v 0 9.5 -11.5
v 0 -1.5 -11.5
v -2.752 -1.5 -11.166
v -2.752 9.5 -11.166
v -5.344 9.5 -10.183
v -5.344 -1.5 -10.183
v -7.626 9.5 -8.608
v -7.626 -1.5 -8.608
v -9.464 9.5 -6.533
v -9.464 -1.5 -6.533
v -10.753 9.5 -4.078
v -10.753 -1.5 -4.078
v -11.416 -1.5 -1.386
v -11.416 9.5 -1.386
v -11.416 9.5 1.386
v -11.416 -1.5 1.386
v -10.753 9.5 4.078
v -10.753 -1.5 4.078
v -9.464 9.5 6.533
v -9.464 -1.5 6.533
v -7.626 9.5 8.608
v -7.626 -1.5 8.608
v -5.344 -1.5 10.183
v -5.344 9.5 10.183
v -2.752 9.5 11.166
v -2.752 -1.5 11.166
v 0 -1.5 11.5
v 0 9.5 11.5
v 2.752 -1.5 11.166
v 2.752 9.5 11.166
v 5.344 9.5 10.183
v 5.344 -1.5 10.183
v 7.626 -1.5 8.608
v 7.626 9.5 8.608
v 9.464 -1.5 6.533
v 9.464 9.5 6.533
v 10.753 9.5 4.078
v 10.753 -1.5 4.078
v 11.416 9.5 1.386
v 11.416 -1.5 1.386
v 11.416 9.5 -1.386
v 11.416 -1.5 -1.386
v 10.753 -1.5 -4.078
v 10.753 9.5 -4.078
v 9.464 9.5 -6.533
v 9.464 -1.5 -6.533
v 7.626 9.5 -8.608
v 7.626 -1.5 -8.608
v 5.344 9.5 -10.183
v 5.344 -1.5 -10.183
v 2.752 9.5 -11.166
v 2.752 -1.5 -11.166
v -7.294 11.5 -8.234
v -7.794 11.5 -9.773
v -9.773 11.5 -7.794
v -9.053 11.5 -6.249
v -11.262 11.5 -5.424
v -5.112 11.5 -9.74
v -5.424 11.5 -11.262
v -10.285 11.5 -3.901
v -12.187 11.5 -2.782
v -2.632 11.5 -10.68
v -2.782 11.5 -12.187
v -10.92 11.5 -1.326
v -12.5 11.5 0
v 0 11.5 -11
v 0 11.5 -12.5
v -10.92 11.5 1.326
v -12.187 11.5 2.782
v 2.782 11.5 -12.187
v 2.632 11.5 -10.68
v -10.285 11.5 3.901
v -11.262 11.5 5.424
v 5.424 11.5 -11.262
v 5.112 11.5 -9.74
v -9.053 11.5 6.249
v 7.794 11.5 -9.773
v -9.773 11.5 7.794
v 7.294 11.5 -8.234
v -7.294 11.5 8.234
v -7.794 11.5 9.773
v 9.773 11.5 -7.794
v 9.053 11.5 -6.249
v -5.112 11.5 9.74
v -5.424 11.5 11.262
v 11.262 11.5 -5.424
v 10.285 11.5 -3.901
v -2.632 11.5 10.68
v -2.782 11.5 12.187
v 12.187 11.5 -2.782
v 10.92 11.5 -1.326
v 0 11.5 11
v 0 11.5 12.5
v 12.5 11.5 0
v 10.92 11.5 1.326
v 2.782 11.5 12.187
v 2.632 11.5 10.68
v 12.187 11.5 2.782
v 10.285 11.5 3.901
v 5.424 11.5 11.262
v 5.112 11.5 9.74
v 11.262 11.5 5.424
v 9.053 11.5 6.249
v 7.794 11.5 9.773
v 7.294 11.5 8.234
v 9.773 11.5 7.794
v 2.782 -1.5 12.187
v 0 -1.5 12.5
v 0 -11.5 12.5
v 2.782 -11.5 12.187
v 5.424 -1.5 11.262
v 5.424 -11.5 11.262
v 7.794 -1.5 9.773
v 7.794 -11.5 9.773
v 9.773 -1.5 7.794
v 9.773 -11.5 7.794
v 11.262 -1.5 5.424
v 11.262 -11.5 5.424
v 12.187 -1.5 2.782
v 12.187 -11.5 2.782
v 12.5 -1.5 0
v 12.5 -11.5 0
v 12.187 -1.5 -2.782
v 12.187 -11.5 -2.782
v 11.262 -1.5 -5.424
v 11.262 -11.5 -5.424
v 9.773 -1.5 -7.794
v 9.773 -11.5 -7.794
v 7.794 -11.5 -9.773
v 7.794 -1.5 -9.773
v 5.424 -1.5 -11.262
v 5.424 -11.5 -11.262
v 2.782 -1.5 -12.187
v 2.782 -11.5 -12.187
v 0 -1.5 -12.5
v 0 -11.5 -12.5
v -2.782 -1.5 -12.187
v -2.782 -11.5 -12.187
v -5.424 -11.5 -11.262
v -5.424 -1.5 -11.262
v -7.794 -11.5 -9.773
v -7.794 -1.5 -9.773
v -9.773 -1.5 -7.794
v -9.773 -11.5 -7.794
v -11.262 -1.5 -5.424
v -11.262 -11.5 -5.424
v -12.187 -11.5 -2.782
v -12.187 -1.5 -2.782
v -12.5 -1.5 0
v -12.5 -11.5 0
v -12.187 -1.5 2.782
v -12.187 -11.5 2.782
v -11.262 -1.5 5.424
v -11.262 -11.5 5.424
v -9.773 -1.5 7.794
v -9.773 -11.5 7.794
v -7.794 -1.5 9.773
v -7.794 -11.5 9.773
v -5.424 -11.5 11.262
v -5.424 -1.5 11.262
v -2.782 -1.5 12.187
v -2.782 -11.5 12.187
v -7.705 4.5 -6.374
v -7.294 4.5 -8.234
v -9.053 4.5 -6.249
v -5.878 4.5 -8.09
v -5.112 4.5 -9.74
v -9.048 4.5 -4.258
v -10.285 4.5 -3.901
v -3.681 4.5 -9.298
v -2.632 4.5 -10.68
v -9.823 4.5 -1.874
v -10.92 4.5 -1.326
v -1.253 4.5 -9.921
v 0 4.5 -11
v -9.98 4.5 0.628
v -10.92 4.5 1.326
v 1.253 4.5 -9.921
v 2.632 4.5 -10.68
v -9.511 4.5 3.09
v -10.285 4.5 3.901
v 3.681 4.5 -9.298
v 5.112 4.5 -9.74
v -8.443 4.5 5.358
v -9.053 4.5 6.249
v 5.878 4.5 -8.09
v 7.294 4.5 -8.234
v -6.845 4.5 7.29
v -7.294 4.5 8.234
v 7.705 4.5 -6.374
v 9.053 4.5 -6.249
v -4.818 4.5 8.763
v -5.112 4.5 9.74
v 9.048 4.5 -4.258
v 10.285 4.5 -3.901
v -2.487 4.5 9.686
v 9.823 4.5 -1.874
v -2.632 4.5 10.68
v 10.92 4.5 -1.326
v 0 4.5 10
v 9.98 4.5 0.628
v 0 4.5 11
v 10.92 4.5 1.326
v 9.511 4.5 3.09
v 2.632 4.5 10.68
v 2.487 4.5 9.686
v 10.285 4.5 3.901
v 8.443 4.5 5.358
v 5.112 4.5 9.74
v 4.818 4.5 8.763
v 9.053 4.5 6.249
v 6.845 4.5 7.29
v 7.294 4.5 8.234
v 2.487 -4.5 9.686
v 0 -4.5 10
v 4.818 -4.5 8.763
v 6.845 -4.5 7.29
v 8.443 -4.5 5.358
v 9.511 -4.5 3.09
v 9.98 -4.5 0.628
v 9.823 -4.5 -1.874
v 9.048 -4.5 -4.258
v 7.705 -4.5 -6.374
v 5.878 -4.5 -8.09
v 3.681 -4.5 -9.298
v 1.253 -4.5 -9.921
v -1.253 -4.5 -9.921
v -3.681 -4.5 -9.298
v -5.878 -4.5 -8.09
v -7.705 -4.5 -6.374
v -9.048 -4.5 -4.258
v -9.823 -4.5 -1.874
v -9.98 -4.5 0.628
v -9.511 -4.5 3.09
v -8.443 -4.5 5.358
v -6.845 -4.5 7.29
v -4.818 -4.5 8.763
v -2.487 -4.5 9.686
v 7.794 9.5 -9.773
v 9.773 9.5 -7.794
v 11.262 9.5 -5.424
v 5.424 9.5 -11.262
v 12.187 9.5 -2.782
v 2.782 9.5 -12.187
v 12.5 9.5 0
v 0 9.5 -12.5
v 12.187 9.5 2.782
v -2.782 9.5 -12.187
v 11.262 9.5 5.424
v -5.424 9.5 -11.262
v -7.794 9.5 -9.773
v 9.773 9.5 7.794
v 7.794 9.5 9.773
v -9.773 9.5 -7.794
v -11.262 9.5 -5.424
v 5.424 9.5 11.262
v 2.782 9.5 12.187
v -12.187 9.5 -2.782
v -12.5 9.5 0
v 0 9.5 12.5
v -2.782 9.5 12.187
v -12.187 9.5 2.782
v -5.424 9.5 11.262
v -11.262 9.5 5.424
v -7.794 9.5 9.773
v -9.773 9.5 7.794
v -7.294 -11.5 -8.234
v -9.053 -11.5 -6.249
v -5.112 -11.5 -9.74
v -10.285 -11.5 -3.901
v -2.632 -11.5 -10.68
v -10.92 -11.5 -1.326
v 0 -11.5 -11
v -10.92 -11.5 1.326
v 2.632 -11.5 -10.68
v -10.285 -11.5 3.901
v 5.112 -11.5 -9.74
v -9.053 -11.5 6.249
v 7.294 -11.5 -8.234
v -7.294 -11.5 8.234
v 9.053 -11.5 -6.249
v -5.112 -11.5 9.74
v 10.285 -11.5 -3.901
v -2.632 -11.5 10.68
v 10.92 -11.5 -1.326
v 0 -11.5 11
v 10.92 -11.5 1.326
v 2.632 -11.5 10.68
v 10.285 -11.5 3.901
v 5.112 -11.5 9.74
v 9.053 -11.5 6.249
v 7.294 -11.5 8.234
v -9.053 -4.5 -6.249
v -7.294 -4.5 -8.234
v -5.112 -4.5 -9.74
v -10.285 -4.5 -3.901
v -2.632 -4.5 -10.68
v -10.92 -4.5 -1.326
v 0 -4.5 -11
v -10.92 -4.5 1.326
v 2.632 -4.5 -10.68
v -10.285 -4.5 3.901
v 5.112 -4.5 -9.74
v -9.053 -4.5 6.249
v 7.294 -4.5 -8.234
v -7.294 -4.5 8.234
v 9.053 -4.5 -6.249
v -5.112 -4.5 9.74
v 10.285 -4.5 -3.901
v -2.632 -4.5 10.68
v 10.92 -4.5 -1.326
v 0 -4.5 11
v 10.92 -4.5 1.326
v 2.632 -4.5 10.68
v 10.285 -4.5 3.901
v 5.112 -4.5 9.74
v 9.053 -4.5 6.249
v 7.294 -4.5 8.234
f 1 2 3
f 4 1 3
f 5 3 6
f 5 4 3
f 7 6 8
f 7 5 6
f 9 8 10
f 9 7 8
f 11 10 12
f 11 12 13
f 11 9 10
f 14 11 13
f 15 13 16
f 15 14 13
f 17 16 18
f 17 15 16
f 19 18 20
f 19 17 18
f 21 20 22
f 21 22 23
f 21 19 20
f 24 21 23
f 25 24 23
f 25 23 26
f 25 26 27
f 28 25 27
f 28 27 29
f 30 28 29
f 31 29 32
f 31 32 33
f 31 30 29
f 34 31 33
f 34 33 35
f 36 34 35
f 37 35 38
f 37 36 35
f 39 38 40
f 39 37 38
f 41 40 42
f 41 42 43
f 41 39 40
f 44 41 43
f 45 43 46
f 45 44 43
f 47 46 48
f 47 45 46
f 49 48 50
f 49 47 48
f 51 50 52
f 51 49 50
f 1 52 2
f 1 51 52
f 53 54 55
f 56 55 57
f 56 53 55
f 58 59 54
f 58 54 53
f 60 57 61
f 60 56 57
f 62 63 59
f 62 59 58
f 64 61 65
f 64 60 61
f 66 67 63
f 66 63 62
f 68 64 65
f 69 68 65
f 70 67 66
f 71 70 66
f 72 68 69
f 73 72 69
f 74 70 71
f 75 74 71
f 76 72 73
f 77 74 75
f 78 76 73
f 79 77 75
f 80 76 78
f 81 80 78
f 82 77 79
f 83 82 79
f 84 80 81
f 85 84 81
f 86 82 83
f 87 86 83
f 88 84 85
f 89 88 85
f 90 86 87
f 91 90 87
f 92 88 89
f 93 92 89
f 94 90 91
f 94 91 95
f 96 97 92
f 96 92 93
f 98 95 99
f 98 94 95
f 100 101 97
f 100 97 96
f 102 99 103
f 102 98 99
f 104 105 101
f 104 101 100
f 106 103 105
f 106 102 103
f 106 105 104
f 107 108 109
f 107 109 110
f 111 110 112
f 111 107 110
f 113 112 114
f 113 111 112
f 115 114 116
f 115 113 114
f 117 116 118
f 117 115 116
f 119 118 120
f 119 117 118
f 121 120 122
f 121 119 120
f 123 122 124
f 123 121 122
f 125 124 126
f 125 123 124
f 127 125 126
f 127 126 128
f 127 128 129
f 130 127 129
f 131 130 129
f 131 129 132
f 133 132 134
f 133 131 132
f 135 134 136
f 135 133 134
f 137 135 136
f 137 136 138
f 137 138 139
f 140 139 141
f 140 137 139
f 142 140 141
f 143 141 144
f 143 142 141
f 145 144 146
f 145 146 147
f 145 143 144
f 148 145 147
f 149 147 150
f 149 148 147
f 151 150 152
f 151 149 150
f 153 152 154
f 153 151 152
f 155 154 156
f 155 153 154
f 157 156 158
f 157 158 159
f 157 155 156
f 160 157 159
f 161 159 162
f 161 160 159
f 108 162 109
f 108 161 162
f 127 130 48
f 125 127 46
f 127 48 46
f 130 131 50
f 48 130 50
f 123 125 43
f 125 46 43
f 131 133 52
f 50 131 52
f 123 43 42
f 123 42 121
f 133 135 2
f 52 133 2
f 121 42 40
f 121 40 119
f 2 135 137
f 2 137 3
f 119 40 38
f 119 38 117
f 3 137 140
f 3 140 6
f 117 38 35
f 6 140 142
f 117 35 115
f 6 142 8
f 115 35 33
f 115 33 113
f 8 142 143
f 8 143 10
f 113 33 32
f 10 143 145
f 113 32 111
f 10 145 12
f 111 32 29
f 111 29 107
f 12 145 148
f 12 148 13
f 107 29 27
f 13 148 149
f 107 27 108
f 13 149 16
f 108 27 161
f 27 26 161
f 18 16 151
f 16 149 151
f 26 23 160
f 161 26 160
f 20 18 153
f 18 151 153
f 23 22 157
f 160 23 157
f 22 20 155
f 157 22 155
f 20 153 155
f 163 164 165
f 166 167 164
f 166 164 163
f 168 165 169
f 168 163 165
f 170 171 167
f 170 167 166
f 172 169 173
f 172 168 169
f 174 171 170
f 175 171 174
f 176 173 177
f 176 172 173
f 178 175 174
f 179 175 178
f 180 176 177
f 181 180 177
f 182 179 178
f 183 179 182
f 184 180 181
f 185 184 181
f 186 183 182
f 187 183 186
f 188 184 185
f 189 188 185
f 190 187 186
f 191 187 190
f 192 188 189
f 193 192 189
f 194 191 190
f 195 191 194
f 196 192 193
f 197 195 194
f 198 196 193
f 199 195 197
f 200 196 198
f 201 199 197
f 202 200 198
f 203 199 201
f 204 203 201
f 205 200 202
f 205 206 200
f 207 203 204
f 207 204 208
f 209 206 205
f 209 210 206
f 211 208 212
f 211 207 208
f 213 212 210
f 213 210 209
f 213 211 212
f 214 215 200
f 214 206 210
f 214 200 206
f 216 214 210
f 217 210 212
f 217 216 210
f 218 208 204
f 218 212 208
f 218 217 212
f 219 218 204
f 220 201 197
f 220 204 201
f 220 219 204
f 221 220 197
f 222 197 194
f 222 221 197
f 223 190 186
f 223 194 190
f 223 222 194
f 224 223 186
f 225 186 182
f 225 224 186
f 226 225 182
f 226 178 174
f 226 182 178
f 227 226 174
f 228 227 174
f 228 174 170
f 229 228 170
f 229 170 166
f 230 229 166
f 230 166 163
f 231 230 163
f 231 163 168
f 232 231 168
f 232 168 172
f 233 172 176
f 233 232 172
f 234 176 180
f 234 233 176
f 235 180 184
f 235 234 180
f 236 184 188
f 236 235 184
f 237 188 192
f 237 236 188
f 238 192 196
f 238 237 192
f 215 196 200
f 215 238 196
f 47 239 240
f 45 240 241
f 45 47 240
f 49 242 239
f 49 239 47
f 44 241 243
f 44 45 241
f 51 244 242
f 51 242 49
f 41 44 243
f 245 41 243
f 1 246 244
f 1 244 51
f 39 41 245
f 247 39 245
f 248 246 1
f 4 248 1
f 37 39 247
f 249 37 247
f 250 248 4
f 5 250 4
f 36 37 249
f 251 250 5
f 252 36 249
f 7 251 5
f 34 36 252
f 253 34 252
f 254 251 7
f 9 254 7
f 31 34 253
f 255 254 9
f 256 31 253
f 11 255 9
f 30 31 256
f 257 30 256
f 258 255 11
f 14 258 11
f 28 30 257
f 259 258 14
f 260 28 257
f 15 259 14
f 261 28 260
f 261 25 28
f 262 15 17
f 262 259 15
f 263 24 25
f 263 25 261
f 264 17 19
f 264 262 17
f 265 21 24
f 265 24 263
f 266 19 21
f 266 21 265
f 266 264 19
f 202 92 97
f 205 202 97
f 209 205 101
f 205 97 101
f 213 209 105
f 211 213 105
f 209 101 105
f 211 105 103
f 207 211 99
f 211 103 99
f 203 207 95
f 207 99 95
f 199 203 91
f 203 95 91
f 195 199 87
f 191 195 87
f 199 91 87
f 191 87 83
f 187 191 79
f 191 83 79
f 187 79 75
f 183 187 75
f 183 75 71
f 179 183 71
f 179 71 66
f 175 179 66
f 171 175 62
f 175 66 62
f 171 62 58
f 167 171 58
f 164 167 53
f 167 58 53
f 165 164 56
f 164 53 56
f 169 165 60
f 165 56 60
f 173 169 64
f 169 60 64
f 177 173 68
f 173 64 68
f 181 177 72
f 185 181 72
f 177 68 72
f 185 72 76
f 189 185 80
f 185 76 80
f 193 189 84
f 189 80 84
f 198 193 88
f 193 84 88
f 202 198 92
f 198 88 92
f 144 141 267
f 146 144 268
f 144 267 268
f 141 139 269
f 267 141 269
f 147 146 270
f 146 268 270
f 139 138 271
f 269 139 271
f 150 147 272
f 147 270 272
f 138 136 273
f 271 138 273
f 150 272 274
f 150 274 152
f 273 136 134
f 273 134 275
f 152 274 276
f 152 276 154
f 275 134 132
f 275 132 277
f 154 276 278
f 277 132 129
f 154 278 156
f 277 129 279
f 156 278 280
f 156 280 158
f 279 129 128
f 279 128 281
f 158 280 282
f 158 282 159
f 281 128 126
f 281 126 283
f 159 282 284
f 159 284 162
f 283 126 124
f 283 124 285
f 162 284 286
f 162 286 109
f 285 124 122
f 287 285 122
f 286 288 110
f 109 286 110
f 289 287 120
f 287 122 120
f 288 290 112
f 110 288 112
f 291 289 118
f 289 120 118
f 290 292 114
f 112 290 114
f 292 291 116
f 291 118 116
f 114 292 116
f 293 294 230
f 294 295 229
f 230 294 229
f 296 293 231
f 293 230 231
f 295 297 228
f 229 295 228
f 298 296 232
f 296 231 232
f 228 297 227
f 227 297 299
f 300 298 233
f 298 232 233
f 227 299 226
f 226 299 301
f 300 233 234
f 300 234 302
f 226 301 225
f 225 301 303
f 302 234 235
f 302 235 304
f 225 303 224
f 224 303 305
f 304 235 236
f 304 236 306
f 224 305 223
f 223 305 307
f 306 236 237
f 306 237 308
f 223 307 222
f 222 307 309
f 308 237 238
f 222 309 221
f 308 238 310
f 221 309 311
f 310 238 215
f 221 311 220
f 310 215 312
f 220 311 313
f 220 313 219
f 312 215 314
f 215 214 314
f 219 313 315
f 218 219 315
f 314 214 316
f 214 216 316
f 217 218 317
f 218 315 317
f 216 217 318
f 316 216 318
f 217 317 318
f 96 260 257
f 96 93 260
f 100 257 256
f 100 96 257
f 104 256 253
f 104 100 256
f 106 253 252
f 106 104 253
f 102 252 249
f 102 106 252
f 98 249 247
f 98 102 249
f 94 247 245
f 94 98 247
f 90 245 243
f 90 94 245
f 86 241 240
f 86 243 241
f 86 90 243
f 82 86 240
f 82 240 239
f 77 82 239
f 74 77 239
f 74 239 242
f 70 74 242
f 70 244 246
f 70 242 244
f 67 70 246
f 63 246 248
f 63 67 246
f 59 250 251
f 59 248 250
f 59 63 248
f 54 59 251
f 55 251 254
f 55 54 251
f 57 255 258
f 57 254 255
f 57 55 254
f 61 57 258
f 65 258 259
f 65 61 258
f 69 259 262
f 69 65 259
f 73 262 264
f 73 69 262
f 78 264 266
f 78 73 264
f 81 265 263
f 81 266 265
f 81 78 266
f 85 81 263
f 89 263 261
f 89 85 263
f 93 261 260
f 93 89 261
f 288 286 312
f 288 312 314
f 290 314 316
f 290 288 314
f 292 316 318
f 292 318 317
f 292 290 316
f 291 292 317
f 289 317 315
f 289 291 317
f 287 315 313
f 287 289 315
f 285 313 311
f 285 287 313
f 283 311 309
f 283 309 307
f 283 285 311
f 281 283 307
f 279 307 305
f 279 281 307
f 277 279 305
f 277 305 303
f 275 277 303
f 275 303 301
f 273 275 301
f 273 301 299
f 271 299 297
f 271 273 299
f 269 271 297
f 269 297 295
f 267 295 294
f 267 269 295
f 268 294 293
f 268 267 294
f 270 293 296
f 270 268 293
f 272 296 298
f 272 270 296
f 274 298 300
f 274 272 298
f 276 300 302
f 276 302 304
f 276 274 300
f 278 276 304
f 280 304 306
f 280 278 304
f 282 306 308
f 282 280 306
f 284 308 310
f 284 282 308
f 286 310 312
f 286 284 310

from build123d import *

# Parameters (mm, degrees)
CROQUIS1_R                 = 12.5
SALIENTE_EXTRUIR1_DEPTH    = 11.5
CROQUIS2_R                 = 11
CORTAR_EXTRUIR1_DEPTH      = 7
CORTAR_EXTRUIR2_DEPTH      = 22.089096709
CORTAR_EXTRUIR2_DEPTH_BACK = 22.089096709
CROQUIS3_R                 = 10
CROQUIS4_W                 = 1
CROQUIS4_H                 = 11


with BuildPart() as part:
    # Croquis1 → Saliente-Extruir1 (new, symmetric)
    with BuildSketch(Plane(origin=(0, 0, 0), x_dir=(1, 0, 0), z_dir=(0, 1, 0))):
        with Locations(Location((0, 0, 0), (0, 0, 270))):
            Circle(CROQUIS1_R)
    extrude(amount=SALIENTE_EXTRUIR1_DEPTH, both=True)

    # Croquis2 → Cortar-Extruir1 (cut)
    with BuildSketch(Plane(origin=(0, 11.5, 0), x_dir=(1, 0, 0), z_dir=(0, 1, 0))):
        with Locations(Location((0, 0, 0), (0, 0, 270))):
            Circle(CROQUIS2_R)
    cortar_extruir1 = extrude(amount=-CORTAR_EXTRUIR1_DEPTH, mode=Mode.SUBTRACT)

    # Croquis3 → Cortar-Extruir2 (cut, two sides: drawn at the far end of the back side and taken through both)
    with BuildSketch(Plane(origin=(0, 0, 0), x_dir=(1, 0, 0), z_dir=(0, 1, 0)).offset(-CORTAR_EXTRUIR2_DEPTH_BACK)):
        with Locations(Location((0, 0, 0), (0, 0, 270))):
            Circle(CROQUIS3_R)
    extrude(amount=CORTAR_EXTRUIR2_DEPTH + CORTAR_EXTRUIR2_DEPTH_BACK, mode=Mode.SUBTRACT)

    # Simetría1: Cortar-Extruir1 across plane
    add(cortar_extruir1.mirror(Plane.ZX), mode=Mode.SUBTRACT)

    # Croquis4 → Cortar-Revolución1 (revolve, cut)
    with BuildSketch(Plane.XY, mode=Mode.PRIVATE) as cortar_revoluci_n1_sk:
        with Locations((12, 4)):
            Rectangle(CROQUIS4_W, CROQUIS4_H)
    revolve(cortar_revoluci_n1_sk.sketch.rotate(Axis((0, -12.65, 0), (0, 1, 0)), 90), axis=Axis((0, -12.65, 0), (0, 1, 0)), mode=Mode.SUBTRACT)


solid = part.part
